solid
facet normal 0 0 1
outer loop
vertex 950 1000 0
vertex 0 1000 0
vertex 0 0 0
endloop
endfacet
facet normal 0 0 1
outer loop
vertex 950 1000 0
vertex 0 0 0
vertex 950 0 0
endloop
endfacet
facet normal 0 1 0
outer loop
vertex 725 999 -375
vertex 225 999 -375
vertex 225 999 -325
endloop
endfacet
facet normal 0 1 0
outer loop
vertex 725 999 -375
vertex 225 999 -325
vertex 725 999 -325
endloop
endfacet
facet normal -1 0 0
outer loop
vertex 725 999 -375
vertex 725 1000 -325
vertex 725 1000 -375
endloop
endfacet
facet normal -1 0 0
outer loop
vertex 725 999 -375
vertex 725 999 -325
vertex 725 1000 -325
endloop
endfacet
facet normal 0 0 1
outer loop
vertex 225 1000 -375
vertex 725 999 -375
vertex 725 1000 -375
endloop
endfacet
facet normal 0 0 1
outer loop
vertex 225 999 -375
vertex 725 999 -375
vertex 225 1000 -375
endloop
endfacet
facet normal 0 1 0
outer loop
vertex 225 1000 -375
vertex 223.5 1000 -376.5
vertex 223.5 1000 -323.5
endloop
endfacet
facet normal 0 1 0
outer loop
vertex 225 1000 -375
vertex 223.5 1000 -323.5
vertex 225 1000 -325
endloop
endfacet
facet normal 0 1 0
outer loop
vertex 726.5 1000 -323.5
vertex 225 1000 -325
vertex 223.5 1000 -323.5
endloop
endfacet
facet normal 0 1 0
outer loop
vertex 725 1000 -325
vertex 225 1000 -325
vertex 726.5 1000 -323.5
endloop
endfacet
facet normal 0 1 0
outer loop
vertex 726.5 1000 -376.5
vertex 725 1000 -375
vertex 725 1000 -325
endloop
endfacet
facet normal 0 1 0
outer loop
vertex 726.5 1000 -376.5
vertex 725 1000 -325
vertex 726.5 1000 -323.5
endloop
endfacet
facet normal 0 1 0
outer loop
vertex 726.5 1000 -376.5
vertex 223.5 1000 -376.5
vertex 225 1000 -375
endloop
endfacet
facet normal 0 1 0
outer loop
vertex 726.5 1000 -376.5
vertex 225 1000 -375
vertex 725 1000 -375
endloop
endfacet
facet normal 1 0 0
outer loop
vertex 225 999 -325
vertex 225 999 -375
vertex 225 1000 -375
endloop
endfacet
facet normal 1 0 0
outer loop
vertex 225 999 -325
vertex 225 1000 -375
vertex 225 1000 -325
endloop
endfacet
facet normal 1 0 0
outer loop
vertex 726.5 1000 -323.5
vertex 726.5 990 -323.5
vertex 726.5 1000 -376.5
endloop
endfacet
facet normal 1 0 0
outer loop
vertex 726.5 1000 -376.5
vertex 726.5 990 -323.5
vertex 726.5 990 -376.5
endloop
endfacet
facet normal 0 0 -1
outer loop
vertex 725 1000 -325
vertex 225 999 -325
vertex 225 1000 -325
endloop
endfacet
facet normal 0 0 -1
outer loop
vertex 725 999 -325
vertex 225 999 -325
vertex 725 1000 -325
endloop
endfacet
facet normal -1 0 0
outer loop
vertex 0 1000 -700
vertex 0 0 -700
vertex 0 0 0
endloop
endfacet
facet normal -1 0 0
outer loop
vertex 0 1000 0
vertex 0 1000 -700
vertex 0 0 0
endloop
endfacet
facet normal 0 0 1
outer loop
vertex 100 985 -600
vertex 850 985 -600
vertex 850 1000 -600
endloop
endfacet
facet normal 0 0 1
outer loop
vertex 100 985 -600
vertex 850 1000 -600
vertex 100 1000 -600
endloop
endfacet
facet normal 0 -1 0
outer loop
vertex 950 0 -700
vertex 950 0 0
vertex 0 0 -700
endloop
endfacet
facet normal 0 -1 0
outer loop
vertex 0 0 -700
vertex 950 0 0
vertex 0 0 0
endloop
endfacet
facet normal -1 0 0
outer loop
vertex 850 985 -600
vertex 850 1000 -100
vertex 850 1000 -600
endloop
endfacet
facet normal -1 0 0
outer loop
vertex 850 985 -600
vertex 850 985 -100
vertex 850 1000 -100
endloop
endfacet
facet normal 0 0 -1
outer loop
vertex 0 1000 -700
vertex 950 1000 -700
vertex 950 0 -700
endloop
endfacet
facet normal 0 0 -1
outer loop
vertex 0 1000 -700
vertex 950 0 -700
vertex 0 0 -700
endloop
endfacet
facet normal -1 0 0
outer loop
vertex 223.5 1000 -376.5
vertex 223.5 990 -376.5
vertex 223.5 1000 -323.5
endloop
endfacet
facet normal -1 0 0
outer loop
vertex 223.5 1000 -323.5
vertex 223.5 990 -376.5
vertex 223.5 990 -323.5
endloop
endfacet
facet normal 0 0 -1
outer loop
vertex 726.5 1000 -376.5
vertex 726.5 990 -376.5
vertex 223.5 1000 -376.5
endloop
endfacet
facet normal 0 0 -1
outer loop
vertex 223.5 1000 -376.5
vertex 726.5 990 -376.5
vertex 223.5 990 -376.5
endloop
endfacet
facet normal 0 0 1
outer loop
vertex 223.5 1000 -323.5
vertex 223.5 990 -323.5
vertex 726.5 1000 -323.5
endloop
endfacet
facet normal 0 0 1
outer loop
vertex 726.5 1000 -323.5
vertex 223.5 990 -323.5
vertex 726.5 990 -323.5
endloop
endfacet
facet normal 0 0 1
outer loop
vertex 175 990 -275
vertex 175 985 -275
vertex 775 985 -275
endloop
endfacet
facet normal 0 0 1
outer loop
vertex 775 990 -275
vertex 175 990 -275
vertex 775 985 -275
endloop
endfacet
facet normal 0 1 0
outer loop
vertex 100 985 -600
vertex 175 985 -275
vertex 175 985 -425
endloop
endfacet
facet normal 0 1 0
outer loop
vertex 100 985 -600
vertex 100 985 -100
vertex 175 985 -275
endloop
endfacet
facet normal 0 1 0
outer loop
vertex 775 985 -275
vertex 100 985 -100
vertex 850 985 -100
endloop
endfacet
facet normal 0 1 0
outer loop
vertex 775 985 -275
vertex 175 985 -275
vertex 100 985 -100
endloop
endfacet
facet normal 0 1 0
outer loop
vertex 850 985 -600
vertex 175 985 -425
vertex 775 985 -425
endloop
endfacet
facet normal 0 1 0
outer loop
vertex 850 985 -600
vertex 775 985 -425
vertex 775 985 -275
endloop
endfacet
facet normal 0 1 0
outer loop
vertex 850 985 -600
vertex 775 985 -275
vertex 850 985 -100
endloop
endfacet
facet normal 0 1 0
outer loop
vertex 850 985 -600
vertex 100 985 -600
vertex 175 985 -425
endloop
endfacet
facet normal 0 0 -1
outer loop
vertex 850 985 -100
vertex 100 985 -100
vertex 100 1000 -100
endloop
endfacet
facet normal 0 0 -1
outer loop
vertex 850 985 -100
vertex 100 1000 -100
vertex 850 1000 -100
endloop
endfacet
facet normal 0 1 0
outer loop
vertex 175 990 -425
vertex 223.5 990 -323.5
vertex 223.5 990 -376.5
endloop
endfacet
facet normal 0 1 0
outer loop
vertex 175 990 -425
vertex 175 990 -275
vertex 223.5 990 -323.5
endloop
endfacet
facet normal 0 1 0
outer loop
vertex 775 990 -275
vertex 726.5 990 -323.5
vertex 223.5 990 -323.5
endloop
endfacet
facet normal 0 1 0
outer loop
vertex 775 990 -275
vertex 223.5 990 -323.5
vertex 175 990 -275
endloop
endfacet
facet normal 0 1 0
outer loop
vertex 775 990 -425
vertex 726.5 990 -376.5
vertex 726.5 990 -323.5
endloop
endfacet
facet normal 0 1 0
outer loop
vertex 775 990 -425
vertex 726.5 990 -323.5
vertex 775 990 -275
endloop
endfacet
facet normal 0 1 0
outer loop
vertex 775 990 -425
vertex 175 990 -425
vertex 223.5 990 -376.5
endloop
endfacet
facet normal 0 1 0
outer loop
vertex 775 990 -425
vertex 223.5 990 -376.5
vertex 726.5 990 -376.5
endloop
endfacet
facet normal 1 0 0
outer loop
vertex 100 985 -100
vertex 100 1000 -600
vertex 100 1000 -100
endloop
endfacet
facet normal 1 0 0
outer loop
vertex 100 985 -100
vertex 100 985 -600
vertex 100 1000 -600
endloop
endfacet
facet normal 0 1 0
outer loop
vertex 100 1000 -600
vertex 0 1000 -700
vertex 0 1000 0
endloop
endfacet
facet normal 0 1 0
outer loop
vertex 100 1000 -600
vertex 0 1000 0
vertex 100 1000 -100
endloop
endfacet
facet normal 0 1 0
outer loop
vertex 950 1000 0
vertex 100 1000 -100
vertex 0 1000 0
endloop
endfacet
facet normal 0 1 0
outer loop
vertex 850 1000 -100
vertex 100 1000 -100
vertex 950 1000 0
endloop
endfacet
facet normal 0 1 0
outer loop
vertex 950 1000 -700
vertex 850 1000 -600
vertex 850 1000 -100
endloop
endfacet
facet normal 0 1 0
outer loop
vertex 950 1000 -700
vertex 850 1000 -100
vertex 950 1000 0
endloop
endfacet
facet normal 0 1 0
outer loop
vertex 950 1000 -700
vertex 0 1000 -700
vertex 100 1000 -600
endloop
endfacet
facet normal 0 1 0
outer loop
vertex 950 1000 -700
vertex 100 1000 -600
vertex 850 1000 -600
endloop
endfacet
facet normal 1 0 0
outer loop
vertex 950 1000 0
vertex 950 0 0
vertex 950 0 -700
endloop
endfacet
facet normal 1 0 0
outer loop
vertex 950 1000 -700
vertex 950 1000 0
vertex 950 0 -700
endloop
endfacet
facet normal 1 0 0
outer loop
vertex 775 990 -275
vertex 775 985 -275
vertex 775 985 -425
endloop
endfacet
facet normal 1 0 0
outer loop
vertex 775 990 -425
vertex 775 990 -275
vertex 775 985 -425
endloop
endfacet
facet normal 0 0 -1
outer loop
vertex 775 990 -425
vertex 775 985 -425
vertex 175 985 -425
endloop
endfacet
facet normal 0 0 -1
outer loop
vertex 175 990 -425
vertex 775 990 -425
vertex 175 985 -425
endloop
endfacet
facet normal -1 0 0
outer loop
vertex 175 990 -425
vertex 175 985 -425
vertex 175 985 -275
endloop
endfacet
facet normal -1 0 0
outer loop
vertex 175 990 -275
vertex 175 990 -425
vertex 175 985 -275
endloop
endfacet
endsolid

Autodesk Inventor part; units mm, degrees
ref_plane "YZ Plane" through (0, 0, 0) normal (1, 0, 0) x (0, 1, 0)
ref_plane "XZ Plane" through (0, 0, 0) normal (0, 1, 0) x (-1, 0, 0)
ref_plane "XY Plane" through (0, 0, 0) normal (0, 0, 1) x (1, 0, 0)
sketch "Sketch1" plane through (0, 0, 0) normal (0, 1, 0) x (-1, 0, 0)
  point P0 (0, 0)
sketch "Sketch2" plane through (0, 0, 0) normal (0, 1, 0) x (-1, 0, 0)
  line L0 (0, 0) -> (-950, 0)
  line L1 (-950, 0) -> (-950, -700)
  line L2 (-950, -700) -> (0, -700)
  line L3 (0, -700) -> (0, 0)
  dimension "d0" = 700
  dimension "d2" = 950
extrude "Extrusion1" add sketch "Sketch2" along normal blind 200
sketch "Sketch4" plane through (0, 200, 0) normal (0, 1, 0) x (1, 0, 0)
  line L0 (0, 0) -> (950, 0) projected
  line L1 (0, 700) -> (0, 0) projected
  line L2 (0, 0) -> (950, 0)
  line L3 (950, 0) -> (950, 700)
  line L4 (950, 700) -> (0, 700)
  line L5 (0, 700) -> (0, 0)
  line L6 (100, 100) -> (850, 100)
  line L7 (850, 100) -> (850, 600)
  line L8 (850, 600) -> (100, 600)
  line L9 (100, 600) -> (100, 100)
  line L10 (175, 275) -> (775, 275)
  line L11 (775, 275) -> (775, 425)
  line L12 (775, 425) -> (175, 425)
  line L13 (175, 425) -> (175, 275)
  line L14 (223.5, 323.5) -> (726.5, 323.5)
  line L15 (726.5, 323.5) -> (726.5, 376.5)
  line L16 (726.5, 376.5) -> (223.5, 376.5)
  line L17 (223.5, 376.5) -> (223.5, 323.5)
  line L18 (225, 325) -> (725, 325)
  line L19 (725, 325) -> (725, 375)
  line L20 (725, 375) -> (225, 375)
  line L21 (225, 375) -> (225, 325)
  dimension "d20" = 1.5
  dimension "d22" = 1.5
  dimension "d23" = 1.5
  dimension "d24" = 1.5
  dimension "d25" = 750
  dimension "d26" = 600
  dimension "d27" = 500
  dimension "d28" = 150
  dimension "d29" = 50
  dimension "d30" = 50
  dimension "d31" = 100
  dimension "d32" = 100
  dimension "d33" = 75
  dimension "d34" = 175
  dimension "d35" = 500
  dimension "d36" = 50
extrude "Extrusion3" add sketch "Sketch4" along normal blind 800 contours L17 L16 L15 L14
extrude "Extrusion4" add sketch "Sketch4" along normal blind 790 contours L13 L12 L11 L10
extrude "Extrusion5" add sketch "Sketch4" along normal blind 785 contours L9 L8 L7 L6
extrude "Extrusion6" add sketch "Sketch4" along normal blind 800 contours L1 L4 L3 L0
extrude "Extrusion7" add sketch "Sketch4" along normal blind 799 contours L21 L20 L19 L18
properties part number "UMD_Gas_Burner"
